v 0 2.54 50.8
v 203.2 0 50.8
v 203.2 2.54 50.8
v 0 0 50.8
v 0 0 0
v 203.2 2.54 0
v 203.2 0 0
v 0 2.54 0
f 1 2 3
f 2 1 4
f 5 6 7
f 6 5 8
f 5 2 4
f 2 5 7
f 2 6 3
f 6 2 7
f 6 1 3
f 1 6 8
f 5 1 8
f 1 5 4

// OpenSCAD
// file: utils.scad
///< Utilities

function rand_clr() = rands( 0,1,3 );

///< Length conversions
function in2mm( i ) = ( i * 25.4 ); 
function mm2in( m ) = ( m / 25.4 );
// file: math.scad
///< Math scad module


///< Find the hypotenuse from two sides of a right triangle
function hyp_from_sides( a, b ) = sqrt( pow( a, 2 ) + pow( b, 2 ) );

///< Find equal sides from hypotenuse of a right triangle
function sides_from_hyp(h) = sqrt( pow( h, 2 ) / 2 );

///< Find A from hypotenuse and B
function a_from_hb( h, b ) = sqrt( pow( h, 2 ) - pow( b, 2 ) );

function dist_2d( pt2, pt1 ) = sqrt(pow(( pt2[0]-pt1[0] ),2) + pow(( pt2[1]-pt1[1]),2) );

function mid_pt_2d( pt2, pt1 ) = [( pt1[0]+pt2[0] )/2, ( pt1[1]+pt2[1] )/2, 0 ];
///< Test for math functions

A = 3;
B = 4;
echo("Given A=", A, "and B=", B );
H = hyp_from_sides( A, B );
echo("Hypotenuse=", H );
echo("Calc Correct = ", (H == 5) );

echo("Given H=", H, " which is a hypotenuse with equal sides" );
echo( "the sides=", sides_from_hyp( H ) );

echo("Given H=", H, "B=", 4 );
echo("A=", a_from_hb( H, 4 ) );

echo("Distance from [-1,1] and [3,4] = ", dist_2d( [-1,1],[3,4]) );
// main file
///< Nameplate
/*
https://en.wikipedia.org/wiki/Nameplate
Excerpt:  'Although office nameplates range in size, the most popular nameplate size is 2 by 8 inches (5.08 cm × 20.32 cm)'


*/
use <math.scad>;
use <utils.scad>;

///< Parameters
units = "mm";

nameplate_width_inches  = 8;  
nameplate_height_inches = 2;
nameplate_depth_inches  = 0.10;

nameplate_width  = in2mm( nameplate_width_inches );
nameplate_height = in2mm( nameplate_height_inches );
nameplate_depth  = in2mm( nameplate_depth_inches );

echo( "Nameplate width: ",  nameplate_width,  "mm" );
echo( "Nameplate height: ", nameplate_height, "mm" );
echo( "Nameplate depth: ",  nameplate_depth,  "mm" );



///< Modules
module Nameplate( width, depth, height, center = false ) {
     cube( [ width, depth, height ], center = center );
}

module object( height, width, depth ){
     cube( height, width, depth );
}


///< Build object
Nameplate( nameplate_width, nameplate_depth, nameplate_height );
